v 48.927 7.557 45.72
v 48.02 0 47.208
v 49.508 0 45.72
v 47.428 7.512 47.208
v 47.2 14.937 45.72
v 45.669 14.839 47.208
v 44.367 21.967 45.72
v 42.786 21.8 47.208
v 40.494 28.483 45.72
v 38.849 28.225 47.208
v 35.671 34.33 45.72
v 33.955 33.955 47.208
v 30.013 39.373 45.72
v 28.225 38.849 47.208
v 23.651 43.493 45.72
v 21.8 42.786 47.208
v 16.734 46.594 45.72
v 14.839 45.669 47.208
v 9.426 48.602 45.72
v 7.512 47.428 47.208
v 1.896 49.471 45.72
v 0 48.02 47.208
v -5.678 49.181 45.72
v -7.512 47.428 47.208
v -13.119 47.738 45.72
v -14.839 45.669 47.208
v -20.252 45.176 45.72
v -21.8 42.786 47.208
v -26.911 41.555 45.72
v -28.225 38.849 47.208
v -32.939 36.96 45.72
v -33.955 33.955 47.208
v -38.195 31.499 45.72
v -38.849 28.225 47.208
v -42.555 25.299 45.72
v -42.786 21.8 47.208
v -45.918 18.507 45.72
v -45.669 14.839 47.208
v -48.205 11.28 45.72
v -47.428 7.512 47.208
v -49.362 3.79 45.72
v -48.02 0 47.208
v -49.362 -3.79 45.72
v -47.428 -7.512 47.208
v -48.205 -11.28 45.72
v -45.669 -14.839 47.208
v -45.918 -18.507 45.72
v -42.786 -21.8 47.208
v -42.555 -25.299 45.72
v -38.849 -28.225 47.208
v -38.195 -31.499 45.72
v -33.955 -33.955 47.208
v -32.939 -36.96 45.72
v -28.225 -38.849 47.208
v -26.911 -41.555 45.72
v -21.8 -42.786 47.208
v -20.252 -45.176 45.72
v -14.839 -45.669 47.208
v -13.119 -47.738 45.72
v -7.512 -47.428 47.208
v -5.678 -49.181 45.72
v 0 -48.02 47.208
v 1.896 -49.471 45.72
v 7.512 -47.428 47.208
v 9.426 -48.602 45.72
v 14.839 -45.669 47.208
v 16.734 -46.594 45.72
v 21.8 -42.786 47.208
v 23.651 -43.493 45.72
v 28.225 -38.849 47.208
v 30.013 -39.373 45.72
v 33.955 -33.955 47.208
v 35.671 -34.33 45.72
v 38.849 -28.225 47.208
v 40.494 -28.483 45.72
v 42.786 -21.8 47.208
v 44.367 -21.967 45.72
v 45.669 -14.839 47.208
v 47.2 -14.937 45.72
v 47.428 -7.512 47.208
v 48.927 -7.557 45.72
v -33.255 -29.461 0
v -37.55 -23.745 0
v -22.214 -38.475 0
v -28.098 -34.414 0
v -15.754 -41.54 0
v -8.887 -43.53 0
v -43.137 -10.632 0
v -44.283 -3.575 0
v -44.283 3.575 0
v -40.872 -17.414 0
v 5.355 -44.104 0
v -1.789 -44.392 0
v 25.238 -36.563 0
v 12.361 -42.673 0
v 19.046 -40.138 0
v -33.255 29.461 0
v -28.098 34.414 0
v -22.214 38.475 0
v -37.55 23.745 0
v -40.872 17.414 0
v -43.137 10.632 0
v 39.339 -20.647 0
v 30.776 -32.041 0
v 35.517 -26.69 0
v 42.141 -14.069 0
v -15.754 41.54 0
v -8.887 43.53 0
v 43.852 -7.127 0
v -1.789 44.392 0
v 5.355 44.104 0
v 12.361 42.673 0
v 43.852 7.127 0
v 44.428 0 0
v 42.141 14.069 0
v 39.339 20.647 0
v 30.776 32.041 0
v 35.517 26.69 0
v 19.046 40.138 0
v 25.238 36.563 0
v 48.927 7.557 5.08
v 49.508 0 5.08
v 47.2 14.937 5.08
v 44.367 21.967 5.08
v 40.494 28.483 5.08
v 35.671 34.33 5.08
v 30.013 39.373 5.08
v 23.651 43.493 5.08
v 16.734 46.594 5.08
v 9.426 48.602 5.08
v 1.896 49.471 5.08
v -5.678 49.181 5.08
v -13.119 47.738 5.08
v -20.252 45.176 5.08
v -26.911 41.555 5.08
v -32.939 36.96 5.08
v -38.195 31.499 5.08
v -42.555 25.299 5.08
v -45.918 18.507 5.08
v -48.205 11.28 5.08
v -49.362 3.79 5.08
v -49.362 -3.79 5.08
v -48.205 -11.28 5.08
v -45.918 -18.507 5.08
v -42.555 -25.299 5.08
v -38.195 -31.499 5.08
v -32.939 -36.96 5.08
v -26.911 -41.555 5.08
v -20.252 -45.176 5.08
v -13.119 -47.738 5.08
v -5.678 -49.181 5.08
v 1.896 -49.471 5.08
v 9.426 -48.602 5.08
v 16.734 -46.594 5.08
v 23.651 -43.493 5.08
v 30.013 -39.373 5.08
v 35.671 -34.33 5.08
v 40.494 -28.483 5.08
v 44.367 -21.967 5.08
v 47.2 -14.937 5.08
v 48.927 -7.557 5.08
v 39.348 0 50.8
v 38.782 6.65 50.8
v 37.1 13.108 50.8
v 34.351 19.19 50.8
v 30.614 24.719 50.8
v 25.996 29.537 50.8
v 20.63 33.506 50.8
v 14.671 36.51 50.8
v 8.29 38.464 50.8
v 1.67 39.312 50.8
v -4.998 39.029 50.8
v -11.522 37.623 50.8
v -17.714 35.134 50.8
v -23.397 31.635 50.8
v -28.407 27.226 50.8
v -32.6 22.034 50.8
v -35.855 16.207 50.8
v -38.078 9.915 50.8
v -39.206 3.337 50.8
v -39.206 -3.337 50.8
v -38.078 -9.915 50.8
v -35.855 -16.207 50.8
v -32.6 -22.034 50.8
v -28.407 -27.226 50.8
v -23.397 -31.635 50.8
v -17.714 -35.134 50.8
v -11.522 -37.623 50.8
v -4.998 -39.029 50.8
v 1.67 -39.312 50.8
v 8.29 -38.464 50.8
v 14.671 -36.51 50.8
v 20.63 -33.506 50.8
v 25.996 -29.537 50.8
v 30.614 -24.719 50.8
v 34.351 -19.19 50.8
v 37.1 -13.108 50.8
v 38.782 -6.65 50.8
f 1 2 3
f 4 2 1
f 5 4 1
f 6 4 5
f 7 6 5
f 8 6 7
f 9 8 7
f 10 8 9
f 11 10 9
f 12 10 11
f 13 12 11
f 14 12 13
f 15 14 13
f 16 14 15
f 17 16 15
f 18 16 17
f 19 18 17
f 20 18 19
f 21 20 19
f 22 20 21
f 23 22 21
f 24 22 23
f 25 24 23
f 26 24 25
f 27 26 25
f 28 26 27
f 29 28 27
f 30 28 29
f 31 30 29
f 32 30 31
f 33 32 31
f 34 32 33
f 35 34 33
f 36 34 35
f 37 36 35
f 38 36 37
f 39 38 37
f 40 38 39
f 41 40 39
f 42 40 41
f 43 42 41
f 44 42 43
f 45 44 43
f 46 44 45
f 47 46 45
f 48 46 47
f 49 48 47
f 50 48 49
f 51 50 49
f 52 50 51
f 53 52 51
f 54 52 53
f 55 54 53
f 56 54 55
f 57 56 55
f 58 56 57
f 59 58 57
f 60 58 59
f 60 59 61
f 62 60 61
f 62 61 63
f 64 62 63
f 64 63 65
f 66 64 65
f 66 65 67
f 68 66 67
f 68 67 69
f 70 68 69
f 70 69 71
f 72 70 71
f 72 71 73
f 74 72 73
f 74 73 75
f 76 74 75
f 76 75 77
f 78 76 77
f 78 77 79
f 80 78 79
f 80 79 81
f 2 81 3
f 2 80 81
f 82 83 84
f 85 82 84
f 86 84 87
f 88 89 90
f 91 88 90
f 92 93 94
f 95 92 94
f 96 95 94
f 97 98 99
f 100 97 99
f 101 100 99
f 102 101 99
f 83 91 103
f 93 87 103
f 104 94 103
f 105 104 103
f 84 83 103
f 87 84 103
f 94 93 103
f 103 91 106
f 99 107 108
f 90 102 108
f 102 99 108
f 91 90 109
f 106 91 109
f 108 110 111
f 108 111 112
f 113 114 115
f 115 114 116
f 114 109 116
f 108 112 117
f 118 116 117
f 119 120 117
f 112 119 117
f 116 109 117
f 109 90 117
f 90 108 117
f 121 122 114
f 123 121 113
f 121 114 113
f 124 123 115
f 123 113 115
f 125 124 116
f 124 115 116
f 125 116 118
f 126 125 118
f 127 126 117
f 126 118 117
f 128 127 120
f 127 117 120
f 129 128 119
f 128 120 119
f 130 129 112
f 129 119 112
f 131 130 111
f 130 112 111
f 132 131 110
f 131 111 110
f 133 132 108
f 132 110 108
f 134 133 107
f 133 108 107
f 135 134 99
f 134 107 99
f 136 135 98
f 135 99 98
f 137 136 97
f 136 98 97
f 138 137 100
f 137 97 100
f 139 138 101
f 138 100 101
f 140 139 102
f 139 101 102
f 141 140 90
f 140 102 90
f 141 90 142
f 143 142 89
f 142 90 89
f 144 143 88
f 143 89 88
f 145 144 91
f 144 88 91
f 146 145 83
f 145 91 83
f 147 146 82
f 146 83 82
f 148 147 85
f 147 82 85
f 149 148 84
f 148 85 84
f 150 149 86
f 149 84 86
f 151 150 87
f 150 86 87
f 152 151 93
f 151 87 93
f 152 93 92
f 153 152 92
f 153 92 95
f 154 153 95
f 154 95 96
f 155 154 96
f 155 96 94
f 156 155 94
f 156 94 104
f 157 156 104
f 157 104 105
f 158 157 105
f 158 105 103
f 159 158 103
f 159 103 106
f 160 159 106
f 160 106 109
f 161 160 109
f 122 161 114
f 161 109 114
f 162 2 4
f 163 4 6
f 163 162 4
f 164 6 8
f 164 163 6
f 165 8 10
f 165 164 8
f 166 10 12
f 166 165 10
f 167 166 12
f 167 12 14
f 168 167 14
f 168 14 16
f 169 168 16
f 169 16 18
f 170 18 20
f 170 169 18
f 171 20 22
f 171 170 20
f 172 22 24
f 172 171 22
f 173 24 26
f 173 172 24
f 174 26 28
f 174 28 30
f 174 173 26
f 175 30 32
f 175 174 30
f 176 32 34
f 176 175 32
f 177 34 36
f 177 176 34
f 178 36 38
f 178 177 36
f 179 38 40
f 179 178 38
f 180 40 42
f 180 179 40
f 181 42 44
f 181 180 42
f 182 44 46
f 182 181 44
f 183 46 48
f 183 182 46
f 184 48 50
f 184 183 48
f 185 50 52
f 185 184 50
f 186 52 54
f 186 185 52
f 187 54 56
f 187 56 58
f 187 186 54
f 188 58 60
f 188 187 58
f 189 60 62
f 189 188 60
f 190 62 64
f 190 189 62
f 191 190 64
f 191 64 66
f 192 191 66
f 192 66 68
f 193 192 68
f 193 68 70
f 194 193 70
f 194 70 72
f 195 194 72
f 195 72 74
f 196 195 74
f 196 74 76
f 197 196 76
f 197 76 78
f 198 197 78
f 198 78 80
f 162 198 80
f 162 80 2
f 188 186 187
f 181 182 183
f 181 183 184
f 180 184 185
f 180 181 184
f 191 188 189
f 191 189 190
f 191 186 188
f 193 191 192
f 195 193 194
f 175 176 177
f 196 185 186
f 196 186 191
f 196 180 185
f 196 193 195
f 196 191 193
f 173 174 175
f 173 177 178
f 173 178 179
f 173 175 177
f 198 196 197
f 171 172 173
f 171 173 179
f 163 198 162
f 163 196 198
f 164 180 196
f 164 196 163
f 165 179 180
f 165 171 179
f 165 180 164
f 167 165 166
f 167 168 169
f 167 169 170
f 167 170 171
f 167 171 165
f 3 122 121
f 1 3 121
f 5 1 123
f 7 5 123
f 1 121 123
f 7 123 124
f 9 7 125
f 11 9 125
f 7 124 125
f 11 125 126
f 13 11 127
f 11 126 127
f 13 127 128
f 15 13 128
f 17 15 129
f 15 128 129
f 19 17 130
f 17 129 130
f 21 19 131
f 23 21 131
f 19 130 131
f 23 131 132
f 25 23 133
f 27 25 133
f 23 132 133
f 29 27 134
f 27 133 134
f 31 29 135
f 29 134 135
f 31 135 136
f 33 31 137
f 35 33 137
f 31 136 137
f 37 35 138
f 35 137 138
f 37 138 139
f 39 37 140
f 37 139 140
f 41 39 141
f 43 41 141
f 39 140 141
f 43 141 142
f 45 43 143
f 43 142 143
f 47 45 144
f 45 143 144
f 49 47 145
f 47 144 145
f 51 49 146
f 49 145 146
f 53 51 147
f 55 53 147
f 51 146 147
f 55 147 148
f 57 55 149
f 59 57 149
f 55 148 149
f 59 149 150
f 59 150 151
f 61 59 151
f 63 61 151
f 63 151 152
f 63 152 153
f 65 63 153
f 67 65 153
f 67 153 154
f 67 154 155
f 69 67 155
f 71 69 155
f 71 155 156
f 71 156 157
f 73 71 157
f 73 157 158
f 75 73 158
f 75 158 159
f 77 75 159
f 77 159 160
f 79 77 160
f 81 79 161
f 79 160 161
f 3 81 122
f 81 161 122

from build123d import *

# Parameters (mm, degrees)
F0_R     = 49.507556
F1_DEPTH = 50.8
F2_SIZE  = 5.08
F3_SIZE  = 5.08


with BuildPart() as f1:
    # F0 (on Top) → F1 (new body)
    with BuildSketch(Plane.XY):
        Circle(F0_R)
    extrude(amount=F1_DEPTH)

    # F2
    f2_edges = [f1.edges().sort_by_distance(p)[0] for p in [
        (-49.507556, 0, 50.8),
        (-49.507556, 0, 0),
    ]]
    chamfer(f2_edges, length=F2_SIZE)

    # F3
    f3_edges = [f1.edges().sort_by_distance(p)[0] for p in [
        (-44.427556, 0, 50.8),
    ]]
    chamfer(f3_edges, length=F3_SIZE)


solid = f1.part
